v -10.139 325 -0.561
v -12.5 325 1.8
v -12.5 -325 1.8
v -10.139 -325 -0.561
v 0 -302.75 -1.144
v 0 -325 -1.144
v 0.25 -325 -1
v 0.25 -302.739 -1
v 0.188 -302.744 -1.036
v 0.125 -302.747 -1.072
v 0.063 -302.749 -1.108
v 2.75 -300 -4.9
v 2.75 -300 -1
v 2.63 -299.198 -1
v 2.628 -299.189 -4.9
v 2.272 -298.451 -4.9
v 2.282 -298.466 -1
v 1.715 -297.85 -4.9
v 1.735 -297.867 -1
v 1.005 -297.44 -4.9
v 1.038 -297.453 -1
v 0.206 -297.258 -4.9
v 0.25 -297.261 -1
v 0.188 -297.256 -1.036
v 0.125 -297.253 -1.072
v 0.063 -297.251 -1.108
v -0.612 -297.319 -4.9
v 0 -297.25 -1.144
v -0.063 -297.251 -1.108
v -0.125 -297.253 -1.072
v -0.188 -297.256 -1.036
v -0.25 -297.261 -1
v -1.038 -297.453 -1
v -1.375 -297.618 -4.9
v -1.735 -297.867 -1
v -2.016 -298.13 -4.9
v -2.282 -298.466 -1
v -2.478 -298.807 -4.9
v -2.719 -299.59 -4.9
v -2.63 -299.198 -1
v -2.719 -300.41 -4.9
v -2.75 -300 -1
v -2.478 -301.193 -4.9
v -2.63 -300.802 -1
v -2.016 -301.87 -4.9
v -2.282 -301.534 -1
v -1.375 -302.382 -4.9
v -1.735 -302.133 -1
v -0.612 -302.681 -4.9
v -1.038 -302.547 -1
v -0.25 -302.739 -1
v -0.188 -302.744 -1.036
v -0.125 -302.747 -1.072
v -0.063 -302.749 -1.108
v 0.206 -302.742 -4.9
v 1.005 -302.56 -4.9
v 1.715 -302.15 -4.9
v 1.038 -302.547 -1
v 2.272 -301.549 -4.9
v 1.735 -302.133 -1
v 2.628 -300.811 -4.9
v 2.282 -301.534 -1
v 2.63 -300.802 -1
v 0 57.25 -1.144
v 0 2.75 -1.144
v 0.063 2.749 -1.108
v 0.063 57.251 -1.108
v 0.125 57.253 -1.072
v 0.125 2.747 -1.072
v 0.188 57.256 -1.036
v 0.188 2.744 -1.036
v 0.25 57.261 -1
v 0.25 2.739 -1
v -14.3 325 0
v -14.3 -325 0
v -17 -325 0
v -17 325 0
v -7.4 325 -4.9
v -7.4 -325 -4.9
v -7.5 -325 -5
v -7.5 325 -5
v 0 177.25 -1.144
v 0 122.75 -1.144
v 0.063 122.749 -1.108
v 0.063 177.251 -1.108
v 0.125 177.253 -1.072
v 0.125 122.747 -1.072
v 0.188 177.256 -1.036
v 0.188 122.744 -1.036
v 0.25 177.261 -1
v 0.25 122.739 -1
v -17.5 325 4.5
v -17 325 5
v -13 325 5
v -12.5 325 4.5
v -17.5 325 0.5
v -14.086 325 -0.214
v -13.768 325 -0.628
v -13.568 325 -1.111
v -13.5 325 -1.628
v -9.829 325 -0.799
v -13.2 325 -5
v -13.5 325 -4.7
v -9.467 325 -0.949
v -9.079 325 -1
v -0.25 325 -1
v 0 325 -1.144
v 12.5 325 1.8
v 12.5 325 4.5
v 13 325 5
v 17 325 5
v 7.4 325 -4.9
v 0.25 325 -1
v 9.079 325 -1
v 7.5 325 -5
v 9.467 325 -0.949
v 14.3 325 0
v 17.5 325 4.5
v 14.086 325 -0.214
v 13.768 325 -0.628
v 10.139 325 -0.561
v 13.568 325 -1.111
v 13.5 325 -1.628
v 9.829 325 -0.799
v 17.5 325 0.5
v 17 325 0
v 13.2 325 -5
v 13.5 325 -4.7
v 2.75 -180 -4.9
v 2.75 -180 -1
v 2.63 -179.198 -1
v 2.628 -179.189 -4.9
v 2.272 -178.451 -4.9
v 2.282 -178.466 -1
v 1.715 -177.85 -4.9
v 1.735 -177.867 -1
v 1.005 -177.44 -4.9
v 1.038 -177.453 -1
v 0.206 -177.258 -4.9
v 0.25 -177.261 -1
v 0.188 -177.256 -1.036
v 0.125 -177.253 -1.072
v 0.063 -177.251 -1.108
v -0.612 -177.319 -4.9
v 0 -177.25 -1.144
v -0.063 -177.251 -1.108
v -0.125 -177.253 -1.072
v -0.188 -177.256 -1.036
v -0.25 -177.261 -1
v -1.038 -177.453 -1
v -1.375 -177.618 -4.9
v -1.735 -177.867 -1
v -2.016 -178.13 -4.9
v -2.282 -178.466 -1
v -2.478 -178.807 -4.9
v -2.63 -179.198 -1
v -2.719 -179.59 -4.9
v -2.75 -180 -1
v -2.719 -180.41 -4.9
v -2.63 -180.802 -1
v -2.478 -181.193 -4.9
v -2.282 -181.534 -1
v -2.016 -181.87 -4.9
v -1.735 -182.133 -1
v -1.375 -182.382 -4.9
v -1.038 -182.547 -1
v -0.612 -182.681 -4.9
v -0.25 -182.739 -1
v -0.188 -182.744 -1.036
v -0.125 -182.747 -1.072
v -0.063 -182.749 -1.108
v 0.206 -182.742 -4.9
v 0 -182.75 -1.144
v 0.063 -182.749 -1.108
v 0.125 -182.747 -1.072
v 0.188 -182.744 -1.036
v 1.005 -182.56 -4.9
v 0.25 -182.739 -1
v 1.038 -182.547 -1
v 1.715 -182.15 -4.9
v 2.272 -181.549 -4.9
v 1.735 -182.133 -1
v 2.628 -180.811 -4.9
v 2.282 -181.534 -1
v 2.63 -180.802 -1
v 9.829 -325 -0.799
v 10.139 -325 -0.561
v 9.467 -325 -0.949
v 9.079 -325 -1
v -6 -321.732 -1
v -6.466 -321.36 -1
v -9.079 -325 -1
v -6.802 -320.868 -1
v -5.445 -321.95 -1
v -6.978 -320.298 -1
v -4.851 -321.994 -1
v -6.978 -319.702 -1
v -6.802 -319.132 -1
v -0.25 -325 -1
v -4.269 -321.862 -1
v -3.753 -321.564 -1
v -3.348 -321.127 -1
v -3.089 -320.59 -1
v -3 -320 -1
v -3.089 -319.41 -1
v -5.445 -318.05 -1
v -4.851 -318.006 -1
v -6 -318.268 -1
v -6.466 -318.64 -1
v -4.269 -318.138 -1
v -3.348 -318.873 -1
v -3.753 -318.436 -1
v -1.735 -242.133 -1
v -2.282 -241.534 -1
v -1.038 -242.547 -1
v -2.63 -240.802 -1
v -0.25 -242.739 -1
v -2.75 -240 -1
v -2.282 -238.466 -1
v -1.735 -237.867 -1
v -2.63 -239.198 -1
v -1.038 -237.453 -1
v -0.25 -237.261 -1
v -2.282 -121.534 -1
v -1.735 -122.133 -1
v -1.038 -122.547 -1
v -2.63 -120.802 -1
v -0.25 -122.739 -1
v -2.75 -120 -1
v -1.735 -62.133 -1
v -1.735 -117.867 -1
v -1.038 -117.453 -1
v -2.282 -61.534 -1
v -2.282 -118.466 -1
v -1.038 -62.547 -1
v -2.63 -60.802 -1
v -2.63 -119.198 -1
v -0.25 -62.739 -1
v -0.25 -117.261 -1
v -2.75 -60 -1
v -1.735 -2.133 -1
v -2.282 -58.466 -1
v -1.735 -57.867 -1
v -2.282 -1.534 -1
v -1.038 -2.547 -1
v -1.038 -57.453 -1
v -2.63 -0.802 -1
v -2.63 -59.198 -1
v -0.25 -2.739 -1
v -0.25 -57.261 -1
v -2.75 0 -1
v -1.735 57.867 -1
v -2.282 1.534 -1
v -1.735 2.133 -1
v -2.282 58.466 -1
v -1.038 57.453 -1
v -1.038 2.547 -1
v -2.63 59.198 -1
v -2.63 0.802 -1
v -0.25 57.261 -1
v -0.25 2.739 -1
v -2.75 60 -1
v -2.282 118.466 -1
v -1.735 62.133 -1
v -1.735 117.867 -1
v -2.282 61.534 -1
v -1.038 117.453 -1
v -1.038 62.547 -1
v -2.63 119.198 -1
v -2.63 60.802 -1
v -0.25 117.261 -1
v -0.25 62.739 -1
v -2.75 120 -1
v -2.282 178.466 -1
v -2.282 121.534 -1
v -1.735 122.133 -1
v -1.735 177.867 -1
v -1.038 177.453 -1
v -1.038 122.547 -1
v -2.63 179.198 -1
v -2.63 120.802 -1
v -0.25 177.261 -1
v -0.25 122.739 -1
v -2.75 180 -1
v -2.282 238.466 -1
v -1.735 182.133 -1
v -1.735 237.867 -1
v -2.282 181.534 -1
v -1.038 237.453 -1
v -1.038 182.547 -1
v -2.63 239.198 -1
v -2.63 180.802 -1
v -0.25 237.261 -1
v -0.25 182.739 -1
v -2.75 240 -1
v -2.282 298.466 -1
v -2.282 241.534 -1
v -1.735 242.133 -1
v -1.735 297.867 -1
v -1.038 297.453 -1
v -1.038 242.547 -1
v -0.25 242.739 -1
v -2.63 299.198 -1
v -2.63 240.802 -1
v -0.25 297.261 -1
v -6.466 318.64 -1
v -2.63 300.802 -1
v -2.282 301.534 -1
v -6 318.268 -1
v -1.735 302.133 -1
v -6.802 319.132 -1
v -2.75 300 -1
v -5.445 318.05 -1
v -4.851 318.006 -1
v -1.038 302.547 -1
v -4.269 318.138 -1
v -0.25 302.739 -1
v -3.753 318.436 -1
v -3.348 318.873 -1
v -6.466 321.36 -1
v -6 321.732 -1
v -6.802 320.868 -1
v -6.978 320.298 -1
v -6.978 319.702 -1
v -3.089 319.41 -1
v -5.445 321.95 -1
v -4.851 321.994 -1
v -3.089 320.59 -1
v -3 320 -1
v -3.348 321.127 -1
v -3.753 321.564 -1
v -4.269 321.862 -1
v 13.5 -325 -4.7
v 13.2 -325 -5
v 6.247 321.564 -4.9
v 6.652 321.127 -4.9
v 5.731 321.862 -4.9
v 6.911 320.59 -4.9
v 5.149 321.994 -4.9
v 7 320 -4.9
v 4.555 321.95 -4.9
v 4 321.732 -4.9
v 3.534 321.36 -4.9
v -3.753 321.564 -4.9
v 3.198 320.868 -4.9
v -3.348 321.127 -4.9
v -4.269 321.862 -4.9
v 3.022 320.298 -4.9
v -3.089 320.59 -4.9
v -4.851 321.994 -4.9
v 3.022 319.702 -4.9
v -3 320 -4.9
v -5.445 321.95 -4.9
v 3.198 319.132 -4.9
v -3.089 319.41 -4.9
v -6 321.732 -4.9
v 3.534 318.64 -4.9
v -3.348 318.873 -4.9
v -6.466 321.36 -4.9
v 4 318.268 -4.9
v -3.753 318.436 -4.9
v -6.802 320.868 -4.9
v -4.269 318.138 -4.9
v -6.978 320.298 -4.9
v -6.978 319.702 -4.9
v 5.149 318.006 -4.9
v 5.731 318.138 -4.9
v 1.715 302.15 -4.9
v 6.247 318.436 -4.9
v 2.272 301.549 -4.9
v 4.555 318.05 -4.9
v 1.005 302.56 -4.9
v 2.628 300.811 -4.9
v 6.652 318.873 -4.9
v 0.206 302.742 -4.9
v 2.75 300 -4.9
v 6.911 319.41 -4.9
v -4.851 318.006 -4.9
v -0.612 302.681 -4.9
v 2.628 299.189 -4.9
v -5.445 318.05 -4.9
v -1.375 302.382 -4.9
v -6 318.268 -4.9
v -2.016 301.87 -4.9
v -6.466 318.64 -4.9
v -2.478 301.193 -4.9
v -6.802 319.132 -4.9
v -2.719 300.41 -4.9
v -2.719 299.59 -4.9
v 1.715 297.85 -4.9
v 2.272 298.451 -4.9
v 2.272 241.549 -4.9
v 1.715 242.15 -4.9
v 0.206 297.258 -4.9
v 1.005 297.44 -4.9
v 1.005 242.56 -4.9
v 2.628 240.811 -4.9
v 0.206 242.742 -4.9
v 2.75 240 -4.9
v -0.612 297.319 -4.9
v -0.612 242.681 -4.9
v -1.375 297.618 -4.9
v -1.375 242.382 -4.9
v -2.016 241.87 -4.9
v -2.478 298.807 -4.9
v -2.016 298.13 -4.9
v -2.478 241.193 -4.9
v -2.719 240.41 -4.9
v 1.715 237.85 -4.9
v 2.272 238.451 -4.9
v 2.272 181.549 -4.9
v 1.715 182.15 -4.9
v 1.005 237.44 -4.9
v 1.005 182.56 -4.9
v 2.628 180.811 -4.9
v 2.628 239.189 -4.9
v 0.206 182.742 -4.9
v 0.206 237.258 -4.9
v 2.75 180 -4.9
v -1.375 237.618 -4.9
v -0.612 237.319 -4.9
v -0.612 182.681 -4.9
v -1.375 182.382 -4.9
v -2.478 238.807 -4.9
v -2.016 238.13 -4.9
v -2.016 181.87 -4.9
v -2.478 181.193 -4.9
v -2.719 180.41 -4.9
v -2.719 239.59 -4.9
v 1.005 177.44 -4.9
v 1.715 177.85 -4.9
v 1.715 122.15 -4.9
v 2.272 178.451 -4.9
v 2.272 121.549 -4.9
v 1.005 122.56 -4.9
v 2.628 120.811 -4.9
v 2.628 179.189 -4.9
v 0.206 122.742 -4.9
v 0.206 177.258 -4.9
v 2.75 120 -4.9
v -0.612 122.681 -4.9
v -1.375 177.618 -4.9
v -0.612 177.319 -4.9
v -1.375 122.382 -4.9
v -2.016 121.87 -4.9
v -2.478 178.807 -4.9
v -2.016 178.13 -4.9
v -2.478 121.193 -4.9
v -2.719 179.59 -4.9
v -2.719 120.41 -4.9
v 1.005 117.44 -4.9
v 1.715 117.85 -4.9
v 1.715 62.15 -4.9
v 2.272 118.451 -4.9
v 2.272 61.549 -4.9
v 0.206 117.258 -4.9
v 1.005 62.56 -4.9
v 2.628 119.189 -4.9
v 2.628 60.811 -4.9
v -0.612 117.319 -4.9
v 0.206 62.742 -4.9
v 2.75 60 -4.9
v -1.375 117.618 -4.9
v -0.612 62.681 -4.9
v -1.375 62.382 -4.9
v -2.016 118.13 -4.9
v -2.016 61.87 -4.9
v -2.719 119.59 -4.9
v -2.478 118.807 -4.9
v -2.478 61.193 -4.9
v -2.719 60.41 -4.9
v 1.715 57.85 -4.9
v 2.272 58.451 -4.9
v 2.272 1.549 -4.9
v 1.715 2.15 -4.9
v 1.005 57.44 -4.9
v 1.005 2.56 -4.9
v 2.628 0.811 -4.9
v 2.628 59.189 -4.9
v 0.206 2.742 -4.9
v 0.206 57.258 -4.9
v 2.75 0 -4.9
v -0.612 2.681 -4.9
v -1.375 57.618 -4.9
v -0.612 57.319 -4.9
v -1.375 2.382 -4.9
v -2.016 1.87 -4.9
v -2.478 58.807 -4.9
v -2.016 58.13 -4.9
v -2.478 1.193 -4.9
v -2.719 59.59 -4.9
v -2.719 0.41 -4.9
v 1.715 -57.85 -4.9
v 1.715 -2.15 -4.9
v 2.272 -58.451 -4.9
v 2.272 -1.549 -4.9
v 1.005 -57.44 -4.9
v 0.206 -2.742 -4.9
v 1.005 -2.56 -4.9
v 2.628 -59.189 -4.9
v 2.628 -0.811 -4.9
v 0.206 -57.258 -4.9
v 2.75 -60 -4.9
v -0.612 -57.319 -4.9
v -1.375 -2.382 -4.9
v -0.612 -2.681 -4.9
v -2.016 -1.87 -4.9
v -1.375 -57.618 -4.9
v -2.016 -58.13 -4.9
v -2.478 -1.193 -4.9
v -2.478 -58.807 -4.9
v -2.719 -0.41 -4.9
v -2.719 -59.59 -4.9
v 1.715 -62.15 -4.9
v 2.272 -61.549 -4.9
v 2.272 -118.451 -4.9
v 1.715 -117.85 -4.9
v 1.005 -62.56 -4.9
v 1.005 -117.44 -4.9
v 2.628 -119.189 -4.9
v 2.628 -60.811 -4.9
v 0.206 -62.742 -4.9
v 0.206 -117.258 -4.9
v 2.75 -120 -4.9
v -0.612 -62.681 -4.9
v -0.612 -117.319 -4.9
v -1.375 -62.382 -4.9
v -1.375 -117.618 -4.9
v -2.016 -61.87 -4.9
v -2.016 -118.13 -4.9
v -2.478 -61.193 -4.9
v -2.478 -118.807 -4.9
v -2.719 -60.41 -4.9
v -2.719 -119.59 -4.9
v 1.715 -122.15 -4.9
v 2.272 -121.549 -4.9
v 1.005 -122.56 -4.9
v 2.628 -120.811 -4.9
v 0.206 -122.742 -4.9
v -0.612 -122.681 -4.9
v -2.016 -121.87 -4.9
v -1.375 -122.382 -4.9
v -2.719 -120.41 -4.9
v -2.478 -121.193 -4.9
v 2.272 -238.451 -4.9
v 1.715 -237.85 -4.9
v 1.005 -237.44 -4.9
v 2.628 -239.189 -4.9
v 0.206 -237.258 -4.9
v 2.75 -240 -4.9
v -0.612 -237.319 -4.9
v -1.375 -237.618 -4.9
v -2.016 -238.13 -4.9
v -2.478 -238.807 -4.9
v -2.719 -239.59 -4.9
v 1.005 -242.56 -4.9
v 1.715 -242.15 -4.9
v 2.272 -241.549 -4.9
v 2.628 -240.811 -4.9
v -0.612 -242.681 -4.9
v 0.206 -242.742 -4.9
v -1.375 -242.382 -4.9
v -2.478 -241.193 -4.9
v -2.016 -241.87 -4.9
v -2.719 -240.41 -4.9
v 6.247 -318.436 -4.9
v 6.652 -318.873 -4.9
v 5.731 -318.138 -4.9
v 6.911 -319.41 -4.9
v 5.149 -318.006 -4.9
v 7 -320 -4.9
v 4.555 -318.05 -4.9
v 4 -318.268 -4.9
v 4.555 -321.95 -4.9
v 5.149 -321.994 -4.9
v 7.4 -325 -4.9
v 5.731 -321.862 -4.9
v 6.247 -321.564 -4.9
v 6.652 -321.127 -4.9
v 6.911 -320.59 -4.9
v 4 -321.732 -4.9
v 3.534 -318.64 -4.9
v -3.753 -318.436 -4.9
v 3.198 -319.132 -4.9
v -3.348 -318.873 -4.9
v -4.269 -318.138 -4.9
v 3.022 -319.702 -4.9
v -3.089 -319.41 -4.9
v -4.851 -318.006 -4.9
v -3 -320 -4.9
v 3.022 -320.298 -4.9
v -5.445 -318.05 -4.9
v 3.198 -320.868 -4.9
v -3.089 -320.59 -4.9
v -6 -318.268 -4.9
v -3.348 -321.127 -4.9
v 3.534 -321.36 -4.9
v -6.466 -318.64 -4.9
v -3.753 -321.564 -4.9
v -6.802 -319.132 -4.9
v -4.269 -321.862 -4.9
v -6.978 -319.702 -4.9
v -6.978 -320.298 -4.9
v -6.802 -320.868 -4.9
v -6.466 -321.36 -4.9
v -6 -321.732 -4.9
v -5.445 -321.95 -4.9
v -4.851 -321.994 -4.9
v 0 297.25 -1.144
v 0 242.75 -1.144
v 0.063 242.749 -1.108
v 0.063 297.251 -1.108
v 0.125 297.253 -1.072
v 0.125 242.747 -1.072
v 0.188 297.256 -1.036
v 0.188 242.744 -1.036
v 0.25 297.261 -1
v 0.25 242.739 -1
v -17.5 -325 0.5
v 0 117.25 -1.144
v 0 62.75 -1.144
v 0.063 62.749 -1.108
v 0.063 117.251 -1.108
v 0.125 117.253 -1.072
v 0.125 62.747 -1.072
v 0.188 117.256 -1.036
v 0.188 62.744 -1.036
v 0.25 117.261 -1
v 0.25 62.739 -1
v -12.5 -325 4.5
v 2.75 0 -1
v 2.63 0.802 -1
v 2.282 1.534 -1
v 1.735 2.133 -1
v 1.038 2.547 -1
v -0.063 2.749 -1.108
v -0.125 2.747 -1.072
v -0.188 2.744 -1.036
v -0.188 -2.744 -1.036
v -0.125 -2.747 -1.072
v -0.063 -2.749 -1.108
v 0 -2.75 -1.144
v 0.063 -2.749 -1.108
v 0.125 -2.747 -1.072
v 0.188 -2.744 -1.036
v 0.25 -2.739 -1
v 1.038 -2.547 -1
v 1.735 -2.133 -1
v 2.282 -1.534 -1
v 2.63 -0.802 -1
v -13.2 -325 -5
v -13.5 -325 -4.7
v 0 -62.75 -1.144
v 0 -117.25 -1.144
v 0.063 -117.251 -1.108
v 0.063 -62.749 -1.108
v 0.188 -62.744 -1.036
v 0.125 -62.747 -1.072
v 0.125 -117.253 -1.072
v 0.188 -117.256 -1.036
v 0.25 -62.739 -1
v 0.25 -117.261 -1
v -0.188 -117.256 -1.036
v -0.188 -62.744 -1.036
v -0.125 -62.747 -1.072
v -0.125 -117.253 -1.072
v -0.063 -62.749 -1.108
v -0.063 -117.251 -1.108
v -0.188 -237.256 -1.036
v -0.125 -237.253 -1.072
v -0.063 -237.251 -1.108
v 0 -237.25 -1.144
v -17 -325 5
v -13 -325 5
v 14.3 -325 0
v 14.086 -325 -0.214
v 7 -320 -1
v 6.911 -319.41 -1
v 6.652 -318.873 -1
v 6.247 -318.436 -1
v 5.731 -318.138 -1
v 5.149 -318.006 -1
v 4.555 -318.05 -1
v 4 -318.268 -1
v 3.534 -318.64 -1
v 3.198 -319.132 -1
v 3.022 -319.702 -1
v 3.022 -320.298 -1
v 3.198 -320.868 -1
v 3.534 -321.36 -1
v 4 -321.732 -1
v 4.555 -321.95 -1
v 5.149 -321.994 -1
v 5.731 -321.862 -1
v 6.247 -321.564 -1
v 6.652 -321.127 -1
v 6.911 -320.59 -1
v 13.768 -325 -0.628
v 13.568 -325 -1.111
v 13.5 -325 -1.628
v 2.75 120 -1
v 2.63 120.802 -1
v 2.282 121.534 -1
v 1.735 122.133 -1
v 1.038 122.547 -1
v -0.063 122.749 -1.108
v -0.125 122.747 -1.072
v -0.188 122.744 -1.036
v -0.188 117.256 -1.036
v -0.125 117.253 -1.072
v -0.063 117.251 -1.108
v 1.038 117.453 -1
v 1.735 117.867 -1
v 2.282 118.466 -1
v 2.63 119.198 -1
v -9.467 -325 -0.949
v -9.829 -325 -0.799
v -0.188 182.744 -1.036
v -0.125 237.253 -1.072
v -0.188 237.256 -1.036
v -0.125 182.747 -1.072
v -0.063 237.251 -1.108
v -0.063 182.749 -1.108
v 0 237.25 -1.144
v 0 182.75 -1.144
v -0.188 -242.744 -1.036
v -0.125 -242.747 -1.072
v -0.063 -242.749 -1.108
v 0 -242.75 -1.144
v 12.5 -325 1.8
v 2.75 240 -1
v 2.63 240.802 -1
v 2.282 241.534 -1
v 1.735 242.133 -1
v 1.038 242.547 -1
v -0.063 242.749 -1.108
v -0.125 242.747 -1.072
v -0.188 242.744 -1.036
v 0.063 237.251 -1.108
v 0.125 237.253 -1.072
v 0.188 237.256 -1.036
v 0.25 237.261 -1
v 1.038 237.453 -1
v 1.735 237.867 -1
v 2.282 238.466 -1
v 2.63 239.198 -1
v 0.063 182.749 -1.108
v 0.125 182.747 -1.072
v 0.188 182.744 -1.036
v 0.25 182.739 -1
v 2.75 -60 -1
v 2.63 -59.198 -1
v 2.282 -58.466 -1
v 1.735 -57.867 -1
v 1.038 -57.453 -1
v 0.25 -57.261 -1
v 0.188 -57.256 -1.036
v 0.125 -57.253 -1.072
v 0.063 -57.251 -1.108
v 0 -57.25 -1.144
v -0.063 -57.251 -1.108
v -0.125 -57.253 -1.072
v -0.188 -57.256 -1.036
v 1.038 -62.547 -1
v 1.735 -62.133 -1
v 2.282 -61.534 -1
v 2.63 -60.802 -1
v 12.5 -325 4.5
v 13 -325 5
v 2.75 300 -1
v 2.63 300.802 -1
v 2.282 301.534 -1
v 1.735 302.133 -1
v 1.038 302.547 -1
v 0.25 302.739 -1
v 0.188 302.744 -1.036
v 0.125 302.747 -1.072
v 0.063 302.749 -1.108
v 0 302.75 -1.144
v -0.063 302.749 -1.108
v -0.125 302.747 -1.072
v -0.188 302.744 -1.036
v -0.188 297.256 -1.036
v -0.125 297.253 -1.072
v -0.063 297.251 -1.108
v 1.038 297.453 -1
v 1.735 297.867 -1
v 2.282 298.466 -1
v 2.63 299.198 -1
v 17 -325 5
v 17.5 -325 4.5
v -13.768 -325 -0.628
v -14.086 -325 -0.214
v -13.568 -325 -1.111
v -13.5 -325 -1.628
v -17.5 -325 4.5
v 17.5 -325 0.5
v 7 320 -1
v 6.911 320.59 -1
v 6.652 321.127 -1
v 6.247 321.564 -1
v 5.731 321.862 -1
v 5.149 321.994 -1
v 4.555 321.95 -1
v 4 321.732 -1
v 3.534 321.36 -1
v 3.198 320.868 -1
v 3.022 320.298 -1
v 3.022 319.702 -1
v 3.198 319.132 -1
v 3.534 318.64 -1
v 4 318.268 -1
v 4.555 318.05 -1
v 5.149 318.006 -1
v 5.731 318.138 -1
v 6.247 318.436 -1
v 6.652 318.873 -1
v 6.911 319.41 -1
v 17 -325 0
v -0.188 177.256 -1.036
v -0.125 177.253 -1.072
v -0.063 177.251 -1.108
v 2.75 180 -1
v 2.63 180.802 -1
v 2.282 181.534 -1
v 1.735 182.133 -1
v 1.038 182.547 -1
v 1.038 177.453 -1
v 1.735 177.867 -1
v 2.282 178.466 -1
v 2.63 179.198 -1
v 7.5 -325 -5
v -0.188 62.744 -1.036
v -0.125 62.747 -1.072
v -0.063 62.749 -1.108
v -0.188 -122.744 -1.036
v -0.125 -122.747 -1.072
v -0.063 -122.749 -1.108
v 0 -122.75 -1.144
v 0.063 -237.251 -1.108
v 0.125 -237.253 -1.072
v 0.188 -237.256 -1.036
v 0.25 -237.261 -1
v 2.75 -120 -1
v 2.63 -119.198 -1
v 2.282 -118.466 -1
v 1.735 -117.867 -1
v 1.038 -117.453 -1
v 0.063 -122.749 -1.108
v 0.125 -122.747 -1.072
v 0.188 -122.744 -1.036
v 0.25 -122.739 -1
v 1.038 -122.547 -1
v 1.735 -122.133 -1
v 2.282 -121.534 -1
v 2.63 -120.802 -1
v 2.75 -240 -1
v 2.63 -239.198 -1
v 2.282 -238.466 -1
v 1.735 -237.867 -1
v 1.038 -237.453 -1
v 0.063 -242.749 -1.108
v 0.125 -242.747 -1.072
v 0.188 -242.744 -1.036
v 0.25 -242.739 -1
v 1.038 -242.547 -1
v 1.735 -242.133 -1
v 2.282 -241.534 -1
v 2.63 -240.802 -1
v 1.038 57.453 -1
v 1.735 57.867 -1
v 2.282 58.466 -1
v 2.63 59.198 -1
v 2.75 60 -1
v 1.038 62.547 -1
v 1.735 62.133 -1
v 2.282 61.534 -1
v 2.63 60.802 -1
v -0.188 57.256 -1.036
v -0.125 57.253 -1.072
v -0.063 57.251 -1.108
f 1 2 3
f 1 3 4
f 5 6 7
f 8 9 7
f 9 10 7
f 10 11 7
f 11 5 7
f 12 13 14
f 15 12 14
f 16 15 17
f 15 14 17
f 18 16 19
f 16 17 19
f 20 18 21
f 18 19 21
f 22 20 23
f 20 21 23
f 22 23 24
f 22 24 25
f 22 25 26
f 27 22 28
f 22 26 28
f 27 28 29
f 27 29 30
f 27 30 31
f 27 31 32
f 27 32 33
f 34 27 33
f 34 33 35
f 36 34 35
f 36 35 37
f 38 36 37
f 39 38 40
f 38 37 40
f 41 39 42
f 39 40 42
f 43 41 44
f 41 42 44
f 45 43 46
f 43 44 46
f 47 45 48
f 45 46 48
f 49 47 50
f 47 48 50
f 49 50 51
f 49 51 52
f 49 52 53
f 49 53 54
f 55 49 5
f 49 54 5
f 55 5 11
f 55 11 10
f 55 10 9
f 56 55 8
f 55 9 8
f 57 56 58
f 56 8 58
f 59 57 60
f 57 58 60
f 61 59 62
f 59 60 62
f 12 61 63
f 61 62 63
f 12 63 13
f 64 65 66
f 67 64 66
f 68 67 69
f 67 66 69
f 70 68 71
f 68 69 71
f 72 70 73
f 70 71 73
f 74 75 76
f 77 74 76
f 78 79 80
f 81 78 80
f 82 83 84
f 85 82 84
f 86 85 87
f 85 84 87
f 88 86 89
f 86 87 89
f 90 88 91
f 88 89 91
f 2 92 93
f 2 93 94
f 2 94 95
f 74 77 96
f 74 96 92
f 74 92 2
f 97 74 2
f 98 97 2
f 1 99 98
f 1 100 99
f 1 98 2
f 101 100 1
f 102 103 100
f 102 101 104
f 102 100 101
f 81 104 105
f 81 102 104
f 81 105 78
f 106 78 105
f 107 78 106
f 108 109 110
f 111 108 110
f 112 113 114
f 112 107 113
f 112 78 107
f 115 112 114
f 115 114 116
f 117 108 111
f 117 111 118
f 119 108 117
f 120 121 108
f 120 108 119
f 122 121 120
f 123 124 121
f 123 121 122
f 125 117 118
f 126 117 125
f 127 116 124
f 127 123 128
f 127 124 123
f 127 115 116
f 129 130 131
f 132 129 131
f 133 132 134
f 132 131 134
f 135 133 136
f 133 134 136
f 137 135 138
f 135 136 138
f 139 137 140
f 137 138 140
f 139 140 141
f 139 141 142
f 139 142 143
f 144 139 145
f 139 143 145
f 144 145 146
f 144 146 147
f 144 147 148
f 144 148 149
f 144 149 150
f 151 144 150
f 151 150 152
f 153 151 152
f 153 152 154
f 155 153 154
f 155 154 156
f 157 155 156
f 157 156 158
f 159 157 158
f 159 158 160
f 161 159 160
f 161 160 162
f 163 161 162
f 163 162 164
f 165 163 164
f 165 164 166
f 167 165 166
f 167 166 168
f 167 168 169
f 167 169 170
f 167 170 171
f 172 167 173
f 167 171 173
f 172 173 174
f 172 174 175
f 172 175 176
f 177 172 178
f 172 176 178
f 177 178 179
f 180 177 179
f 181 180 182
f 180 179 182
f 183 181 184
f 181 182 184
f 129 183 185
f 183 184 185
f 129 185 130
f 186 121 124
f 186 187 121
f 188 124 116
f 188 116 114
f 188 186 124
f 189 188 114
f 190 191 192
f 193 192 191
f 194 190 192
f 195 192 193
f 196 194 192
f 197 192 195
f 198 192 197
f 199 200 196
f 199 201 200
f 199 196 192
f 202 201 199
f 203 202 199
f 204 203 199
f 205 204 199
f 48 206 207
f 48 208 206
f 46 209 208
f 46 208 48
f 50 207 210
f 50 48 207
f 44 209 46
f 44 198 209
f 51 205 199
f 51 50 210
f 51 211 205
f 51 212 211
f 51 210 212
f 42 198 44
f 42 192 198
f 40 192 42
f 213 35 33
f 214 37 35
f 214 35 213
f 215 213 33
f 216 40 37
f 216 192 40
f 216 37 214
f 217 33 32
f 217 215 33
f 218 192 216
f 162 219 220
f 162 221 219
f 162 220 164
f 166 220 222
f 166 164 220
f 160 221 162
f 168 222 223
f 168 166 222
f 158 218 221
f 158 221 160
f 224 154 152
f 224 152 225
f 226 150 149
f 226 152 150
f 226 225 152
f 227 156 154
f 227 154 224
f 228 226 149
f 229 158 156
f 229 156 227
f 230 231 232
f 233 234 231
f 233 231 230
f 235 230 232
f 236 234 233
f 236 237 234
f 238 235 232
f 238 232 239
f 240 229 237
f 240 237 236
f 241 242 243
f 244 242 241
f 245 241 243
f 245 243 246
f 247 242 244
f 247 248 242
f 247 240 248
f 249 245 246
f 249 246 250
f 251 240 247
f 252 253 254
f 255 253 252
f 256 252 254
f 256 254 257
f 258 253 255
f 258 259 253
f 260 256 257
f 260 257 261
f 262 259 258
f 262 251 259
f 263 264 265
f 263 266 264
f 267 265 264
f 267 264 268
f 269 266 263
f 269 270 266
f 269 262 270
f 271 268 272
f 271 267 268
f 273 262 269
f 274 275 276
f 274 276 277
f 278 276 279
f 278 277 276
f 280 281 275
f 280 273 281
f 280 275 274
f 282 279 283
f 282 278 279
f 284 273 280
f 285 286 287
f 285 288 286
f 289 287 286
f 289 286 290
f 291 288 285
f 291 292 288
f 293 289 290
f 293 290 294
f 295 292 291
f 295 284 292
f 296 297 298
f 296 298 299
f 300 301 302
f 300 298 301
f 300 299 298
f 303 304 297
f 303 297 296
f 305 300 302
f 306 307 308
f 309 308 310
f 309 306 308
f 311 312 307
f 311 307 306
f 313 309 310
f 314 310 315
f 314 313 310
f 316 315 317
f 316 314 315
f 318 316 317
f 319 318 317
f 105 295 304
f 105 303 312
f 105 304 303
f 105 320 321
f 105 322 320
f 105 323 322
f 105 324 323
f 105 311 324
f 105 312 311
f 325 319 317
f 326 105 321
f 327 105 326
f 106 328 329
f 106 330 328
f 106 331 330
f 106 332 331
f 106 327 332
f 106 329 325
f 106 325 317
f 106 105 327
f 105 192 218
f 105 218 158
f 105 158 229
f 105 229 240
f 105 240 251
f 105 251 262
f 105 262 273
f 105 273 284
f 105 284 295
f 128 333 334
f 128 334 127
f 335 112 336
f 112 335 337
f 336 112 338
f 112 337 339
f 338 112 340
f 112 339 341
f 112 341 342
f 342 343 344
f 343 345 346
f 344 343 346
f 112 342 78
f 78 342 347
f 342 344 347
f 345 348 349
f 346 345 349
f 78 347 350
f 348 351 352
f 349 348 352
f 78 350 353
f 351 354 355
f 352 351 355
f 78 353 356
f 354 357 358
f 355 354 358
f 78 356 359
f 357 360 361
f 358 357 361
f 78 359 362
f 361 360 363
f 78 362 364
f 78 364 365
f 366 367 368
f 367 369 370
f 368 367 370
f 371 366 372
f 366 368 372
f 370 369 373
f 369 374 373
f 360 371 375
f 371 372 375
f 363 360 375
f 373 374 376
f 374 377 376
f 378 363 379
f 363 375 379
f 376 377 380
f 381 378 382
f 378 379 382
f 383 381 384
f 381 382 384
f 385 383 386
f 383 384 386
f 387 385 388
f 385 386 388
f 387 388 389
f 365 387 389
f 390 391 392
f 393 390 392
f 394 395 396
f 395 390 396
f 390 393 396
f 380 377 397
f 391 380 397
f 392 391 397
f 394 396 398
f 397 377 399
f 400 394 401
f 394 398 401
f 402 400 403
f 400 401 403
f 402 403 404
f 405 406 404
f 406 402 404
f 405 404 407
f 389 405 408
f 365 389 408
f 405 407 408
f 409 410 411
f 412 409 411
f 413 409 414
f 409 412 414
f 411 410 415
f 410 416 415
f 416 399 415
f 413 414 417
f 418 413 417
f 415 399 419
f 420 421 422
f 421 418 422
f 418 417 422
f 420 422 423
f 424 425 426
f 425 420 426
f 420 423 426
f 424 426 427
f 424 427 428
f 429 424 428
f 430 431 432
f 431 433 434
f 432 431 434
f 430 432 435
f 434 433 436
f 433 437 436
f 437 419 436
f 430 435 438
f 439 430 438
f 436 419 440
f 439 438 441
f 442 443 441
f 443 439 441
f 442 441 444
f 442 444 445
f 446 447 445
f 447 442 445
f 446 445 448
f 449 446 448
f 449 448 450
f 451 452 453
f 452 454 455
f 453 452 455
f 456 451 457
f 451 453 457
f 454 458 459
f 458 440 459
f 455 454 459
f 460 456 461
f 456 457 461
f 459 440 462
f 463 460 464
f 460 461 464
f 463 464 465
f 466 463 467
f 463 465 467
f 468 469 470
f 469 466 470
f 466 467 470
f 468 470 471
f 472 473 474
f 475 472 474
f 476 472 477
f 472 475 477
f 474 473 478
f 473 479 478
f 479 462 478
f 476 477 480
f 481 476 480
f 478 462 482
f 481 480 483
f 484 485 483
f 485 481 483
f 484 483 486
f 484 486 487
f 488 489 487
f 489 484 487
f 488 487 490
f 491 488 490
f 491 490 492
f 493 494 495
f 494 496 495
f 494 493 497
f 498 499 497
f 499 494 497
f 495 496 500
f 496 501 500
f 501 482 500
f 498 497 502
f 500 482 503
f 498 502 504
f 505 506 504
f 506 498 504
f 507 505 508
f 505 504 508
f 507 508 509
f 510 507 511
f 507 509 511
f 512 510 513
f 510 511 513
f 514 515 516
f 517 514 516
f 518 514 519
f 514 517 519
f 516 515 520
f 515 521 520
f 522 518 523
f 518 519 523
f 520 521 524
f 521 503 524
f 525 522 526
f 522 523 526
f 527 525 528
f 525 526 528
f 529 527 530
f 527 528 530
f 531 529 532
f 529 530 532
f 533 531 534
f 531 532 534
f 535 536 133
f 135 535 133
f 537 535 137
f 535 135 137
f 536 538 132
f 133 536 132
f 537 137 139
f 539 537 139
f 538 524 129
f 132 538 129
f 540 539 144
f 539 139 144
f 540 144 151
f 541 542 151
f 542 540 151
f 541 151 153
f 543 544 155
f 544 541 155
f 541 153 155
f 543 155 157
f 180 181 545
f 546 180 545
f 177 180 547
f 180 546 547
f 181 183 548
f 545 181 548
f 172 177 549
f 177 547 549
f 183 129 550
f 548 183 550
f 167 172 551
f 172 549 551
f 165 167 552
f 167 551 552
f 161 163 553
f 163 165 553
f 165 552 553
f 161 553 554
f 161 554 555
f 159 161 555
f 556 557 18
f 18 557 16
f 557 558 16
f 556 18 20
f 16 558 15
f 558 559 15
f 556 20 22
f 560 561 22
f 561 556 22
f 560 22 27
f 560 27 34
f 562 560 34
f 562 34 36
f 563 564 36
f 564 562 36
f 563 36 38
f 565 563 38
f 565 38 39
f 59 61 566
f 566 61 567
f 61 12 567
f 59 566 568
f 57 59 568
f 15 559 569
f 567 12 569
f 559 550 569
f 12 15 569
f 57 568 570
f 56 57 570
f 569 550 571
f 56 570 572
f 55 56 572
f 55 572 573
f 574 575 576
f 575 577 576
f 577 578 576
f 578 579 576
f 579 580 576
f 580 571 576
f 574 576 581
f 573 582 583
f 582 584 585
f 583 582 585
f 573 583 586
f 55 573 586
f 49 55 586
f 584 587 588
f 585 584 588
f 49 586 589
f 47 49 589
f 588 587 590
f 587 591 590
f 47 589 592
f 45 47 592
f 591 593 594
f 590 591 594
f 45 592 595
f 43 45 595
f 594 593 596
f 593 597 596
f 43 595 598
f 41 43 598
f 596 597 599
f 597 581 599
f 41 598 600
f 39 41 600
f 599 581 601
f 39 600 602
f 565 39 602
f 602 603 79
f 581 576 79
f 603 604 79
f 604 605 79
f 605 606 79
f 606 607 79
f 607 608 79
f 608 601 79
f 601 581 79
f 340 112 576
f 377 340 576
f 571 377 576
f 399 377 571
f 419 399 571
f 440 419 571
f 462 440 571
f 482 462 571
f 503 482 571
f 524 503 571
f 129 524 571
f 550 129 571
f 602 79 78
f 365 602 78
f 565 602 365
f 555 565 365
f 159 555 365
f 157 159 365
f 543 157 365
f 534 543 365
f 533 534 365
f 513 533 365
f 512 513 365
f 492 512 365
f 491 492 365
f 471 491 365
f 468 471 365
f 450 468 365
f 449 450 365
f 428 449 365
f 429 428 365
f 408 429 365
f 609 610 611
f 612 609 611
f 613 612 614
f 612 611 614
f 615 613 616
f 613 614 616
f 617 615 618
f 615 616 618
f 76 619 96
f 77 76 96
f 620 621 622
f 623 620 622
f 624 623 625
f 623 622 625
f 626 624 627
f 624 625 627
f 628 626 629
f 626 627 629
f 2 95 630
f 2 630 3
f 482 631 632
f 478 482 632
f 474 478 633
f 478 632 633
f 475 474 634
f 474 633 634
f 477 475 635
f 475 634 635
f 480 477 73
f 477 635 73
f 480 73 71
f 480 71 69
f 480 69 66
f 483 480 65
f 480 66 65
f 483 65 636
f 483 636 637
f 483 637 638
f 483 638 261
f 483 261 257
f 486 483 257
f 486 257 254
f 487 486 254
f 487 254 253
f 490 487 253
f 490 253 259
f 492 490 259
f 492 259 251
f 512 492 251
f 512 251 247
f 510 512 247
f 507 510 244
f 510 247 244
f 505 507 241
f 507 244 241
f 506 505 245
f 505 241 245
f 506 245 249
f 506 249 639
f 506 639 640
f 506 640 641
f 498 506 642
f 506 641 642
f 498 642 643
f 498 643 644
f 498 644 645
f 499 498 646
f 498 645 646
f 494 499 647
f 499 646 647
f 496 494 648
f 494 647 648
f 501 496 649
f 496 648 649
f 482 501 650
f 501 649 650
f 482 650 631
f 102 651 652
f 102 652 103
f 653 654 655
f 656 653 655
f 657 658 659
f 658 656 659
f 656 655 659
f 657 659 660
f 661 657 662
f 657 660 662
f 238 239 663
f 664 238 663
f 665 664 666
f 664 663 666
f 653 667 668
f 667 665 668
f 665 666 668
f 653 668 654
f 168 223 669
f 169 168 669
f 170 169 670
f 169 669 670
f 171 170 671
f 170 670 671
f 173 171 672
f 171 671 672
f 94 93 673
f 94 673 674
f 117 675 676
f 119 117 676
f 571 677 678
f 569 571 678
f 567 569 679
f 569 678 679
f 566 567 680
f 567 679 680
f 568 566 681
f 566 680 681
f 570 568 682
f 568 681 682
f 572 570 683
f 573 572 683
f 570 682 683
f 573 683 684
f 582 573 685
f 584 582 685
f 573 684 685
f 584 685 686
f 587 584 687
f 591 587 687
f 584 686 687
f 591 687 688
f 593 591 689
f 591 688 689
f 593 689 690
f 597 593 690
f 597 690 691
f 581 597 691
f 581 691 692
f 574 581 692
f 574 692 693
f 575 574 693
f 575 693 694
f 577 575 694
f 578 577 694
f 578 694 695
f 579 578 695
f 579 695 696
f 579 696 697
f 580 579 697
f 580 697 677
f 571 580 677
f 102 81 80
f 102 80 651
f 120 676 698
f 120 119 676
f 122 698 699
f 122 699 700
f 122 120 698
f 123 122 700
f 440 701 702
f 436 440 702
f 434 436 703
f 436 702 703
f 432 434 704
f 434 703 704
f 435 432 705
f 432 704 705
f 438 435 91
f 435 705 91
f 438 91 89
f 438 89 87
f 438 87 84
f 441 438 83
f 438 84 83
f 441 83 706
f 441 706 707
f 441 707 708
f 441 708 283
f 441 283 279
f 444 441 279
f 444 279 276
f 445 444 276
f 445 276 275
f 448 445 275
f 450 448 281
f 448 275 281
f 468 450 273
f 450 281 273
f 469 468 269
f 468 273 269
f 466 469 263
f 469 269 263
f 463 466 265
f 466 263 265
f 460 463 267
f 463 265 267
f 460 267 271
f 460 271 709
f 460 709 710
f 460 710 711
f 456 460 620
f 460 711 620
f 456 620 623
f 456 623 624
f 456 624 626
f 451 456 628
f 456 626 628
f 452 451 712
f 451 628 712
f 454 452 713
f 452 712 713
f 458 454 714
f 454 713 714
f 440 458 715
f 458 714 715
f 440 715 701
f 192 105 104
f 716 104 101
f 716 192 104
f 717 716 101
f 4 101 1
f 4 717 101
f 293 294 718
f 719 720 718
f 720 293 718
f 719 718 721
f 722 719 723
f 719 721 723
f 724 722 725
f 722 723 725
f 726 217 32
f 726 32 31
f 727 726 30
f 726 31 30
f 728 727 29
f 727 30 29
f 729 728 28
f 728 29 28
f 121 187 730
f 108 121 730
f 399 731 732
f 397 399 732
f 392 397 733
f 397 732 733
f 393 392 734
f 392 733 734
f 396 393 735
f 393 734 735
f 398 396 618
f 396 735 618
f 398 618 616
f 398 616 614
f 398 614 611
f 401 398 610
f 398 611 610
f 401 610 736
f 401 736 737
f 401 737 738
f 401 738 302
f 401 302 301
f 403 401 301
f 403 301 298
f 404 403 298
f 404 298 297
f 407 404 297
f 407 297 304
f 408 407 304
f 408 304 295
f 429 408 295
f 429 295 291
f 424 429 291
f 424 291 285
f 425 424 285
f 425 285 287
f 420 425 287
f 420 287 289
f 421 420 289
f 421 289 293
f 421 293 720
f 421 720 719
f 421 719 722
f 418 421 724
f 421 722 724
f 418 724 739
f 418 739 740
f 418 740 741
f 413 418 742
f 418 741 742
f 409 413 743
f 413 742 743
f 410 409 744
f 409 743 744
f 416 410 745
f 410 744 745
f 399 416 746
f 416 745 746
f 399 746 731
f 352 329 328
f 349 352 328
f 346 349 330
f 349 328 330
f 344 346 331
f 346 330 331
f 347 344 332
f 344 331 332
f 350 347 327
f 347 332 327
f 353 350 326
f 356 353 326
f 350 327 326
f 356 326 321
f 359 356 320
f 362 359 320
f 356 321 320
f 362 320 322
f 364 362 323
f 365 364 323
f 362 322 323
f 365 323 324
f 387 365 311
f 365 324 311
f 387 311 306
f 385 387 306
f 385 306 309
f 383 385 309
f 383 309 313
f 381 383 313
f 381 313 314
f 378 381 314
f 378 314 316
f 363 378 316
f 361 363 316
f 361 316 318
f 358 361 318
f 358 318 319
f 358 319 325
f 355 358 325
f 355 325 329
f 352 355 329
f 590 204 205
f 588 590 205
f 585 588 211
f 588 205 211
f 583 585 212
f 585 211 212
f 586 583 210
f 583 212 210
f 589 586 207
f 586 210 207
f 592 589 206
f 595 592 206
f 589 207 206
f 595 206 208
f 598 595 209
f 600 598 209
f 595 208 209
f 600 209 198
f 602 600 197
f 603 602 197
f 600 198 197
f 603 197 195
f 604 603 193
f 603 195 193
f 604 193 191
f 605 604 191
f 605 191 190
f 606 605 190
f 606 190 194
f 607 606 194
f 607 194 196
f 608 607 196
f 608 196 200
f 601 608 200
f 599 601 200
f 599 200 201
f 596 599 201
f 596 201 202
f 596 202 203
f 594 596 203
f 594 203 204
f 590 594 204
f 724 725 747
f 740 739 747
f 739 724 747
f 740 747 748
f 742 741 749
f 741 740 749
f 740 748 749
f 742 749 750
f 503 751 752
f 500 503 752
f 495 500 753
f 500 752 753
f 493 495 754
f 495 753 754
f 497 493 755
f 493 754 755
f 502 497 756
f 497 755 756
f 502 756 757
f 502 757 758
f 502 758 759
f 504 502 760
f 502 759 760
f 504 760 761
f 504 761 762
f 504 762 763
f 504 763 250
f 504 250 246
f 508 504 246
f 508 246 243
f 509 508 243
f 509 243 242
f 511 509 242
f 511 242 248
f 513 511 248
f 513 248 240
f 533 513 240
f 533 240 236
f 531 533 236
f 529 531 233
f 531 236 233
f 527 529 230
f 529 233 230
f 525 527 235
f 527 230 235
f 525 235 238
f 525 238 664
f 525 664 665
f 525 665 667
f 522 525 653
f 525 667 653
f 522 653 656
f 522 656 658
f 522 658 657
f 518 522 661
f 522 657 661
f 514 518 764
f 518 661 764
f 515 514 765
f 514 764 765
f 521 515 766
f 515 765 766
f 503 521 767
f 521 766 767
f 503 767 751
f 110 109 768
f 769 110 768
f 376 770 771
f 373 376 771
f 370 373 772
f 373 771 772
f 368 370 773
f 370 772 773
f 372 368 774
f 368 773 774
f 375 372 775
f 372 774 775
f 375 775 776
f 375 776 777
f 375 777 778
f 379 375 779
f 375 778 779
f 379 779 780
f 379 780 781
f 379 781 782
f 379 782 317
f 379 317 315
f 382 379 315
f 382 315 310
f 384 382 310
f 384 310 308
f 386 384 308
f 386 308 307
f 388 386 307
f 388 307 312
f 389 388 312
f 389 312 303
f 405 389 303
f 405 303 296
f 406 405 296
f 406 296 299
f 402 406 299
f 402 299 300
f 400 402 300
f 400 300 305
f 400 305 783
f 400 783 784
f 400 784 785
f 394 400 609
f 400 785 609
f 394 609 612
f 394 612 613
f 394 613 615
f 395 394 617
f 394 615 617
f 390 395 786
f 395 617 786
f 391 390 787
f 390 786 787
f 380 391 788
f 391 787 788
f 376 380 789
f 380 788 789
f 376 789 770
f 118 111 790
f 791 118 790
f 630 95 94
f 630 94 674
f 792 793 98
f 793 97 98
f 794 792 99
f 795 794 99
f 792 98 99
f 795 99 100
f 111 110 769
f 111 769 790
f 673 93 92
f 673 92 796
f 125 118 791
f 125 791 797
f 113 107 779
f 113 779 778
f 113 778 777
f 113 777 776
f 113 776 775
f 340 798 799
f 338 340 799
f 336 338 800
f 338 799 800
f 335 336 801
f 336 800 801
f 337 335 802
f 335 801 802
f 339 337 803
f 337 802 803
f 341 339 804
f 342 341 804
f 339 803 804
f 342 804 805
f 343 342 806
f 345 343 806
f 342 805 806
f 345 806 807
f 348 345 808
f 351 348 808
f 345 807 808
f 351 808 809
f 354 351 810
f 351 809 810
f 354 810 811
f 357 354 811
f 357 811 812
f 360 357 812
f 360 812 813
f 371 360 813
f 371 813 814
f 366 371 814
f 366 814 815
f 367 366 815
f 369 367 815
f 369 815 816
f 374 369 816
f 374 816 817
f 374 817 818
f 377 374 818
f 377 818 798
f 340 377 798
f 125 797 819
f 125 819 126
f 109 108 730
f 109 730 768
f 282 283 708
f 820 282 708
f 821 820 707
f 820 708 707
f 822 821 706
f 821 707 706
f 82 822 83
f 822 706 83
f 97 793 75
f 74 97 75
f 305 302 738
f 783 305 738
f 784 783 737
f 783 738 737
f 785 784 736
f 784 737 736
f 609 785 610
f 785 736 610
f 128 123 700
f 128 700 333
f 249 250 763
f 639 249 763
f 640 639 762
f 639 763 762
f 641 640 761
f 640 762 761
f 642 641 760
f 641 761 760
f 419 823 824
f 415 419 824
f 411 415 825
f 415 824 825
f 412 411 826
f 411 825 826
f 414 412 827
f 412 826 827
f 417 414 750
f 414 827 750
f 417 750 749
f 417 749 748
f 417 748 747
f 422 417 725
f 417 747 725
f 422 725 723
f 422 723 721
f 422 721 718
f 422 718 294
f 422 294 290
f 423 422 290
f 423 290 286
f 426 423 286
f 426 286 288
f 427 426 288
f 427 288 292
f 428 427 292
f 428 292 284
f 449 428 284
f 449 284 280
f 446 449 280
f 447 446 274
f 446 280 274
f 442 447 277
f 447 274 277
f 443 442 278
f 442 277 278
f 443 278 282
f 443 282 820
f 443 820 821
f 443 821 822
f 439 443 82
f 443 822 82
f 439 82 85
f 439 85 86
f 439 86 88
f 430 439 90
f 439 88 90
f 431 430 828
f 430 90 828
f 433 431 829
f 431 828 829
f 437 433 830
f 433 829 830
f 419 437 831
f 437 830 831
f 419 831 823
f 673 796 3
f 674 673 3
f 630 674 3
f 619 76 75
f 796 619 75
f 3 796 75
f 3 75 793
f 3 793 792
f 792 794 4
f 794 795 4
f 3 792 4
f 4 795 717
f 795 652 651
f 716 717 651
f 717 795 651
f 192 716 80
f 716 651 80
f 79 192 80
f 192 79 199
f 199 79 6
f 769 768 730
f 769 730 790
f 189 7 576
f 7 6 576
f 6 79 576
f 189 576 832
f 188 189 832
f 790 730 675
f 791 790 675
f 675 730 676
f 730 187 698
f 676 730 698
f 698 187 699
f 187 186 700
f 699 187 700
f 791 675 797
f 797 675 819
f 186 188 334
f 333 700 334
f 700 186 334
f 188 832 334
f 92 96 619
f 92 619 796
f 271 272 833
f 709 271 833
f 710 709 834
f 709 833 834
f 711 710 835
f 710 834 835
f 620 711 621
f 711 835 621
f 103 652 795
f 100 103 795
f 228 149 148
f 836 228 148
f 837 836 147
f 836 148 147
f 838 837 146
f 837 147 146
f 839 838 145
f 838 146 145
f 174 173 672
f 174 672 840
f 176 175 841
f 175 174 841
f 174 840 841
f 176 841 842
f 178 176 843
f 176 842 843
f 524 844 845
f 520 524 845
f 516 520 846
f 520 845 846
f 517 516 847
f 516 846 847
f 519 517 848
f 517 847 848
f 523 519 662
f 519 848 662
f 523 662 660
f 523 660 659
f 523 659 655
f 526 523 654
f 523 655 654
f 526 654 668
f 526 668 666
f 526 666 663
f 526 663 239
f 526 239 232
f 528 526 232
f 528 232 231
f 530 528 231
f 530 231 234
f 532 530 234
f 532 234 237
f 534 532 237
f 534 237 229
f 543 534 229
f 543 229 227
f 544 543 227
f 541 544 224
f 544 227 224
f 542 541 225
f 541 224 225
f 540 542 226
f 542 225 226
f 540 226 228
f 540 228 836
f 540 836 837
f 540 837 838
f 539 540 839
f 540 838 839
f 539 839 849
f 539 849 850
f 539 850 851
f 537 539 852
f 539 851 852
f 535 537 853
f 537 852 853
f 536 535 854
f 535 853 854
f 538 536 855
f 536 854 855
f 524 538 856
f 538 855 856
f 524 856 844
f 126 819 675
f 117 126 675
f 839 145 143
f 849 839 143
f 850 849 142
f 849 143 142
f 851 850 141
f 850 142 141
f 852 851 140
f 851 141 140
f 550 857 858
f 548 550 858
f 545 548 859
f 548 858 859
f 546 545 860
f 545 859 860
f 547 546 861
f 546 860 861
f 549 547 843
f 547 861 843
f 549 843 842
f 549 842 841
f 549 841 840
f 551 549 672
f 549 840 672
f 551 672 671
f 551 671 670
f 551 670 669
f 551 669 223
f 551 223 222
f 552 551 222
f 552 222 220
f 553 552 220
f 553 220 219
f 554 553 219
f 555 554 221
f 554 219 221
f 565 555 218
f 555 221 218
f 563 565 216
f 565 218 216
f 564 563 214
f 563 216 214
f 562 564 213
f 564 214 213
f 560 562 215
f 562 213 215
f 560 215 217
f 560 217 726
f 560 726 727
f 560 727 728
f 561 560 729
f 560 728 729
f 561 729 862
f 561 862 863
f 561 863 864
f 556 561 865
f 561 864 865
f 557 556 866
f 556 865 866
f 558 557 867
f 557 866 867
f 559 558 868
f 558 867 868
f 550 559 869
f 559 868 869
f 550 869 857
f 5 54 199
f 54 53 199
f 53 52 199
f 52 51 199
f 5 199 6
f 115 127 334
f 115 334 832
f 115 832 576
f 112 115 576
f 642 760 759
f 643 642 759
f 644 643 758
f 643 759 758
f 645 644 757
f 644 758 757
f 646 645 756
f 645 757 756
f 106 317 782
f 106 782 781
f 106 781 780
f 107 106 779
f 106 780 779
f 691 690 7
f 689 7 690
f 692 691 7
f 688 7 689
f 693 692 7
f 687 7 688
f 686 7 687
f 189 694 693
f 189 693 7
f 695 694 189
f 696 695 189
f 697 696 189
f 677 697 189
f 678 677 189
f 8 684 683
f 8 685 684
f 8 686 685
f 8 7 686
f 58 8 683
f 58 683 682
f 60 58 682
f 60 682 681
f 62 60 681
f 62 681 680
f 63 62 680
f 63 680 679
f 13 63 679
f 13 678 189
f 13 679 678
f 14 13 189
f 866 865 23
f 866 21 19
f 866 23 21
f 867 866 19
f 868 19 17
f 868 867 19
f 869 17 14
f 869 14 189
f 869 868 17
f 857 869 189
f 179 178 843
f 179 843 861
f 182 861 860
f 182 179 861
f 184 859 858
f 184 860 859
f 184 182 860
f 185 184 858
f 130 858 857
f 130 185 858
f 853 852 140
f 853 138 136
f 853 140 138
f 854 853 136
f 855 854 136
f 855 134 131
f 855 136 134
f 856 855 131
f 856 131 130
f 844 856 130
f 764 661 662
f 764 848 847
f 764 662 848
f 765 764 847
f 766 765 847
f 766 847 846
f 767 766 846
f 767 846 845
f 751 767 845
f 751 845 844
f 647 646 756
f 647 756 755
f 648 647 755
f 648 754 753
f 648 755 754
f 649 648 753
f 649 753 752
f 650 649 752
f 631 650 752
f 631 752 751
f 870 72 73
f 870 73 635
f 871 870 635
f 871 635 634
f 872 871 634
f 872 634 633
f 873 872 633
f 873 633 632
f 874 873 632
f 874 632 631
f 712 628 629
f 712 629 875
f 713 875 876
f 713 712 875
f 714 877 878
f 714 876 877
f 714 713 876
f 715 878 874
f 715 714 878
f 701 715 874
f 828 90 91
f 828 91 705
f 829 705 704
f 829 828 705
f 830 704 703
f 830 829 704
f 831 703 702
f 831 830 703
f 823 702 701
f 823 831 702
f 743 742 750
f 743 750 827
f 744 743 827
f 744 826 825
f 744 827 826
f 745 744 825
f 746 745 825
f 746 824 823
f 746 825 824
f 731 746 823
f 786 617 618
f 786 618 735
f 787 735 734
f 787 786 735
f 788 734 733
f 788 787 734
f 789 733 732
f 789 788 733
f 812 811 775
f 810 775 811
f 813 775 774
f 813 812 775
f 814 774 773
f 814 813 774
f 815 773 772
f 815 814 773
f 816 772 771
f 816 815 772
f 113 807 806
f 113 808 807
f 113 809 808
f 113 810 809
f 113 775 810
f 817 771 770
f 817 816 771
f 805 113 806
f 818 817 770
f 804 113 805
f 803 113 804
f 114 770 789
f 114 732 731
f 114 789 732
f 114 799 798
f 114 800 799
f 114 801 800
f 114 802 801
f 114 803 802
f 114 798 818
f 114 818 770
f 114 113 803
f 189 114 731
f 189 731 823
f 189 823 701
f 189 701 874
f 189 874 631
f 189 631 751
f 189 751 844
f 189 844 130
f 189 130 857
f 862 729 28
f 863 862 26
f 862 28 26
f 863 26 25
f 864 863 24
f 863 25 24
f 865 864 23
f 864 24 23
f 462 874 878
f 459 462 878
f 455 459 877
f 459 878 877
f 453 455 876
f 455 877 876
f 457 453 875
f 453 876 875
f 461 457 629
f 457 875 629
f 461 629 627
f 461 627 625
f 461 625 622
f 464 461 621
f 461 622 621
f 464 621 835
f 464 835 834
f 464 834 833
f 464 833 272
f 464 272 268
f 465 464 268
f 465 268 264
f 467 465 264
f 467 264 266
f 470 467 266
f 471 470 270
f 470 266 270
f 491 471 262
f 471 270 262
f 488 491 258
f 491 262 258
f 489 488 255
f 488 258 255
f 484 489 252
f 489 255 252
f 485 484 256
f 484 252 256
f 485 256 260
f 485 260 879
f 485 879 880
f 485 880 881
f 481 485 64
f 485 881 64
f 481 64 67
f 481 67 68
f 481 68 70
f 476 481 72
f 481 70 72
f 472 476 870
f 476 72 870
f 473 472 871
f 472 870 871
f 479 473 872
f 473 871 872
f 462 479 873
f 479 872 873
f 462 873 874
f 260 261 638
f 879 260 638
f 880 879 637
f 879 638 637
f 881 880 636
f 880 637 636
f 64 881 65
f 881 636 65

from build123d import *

# Parameters (mm, degrees)
BOSS_EXTRU_1_DEPTH                  = 650
ENL_V_MAT_EXTRU_1_DEPTH             = 651.254758327
ENL_V_MAT_EXTRU_2_DEPTH             = 650
ENL_V_MAT_EXTRU_3_DEPTH             = 651.254758327
ENL_V_MAT_EXTRU_4_DEPTH             = 650
DIAM_TRE_DU_PER_AGE_5_5_5_5_1_D     = 5.5
DIAM_TRE_DU_PER_AGE_5_5_5_5_1_DEPTH = 9.900000103
CHANFREIN1_SIZE2                    = 0.499999975
CHANFREIN1_SIZE                     = 0.5
CHANFREIN2_SIZE                     = 0.3
CHANFREIN3_SIZE2                    = 0.500000028
CHANFREIN3_SIZE                     = 0.499999997
CHANFREIN4_SIZE                     = 0.5
CHANFREIN4_SIZE2                    = 0.500000014
CONG_1_R                            = 1.499999963
CONG_2_R                            = 1.999999944
ESQUISSE8_R                         = 2
ENL_V_MAT_EXTRU_5_DEPTH             = 10


with BuildPart() as part:
    # Esquisse1 → Boss.-Extru.1 (new body)
    with BuildSketch(Plane(origin=(0, 325, 0), x_dir=(1, 0, 0), z_dir=(0, 1, 0))):
        Polygon((-9.70002034, 1.00000045), (9.70002034, 1.00000045), (12.50002072, -1.79999993), (12.50002072, -4.999999928), (17.50002072, -4.999999928), (17.50002072, 5.000000175), (-17.50002072, 5.000000175), (-17.50002072, -4.999999928), (-12.50002072, -4.999999928), (-12.50002072, -1.79999993), align=None)
    extrude(amount=-BOSS_EXTRU_1_DEPTH)

    # Esquisse2 → Enlèv. mat.-Extru.1 (cut, through all)
    with BuildSketch(Plane.XZ.offset(325)):
        Polygon((-14.30002069, -6.7e-08), (-17.50002072, -6.7e-08), (-17.50002072, -5.000000175), (-13.50002072, -5.000000175), (-13.50002072, -0.799999947), align=None)
    extrude(amount=-ENL_V_MAT_EXTRU_1_DEPTH, mode=Mode.SUBTRACT)

    # Esquisse3 → Enlèv. mat.-Extru.2 (cut)
    with BuildSketch(Plane.XZ.offset(325)):
        Polygon((0.25, -1.000000175), (-0.25, -1.000000175), (1e-09, -1.144337743), align=None)
    extrude(amount=-ENL_V_MAT_EXTRU_2_DEPTH, mode=Mode.SUBTRACT)

    # Esquisse4 → Enlèv. mat.-Extru.3 (cut, through all)
    with BuildSketch(Plane.XZ.offset(325)):
        Polygon((13.50002072, -0.799999925), (13.50002072, -5.000000175), (17.50002072, -5.000000175), (17.50002072, 7.5e-08), (14.30002072, 7.5e-08), align=None)
    extrude(amount=-ENL_V_MAT_EXTRU_3_DEPTH, mode=Mode.SUBTRACT)

    # Esquisse5 → Enlèv. mat.-Extru.4 (cut)
    with BuildSketch(Plane.XZ.offset(325)):
        Polygon((-7.50002072, -5.000000175), (7.50002072, -5.000000175), (7.40002072, -4.900000175), (-7.40002072, -4.900000175), align=None)
    extrude(amount=-ENL_V_MAT_EXTRU_4_DEPTH, mode=Mode.SUBTRACT)

    # Diamètre du perçage Ø5.5 (5.5)1
    with Locations(Plane(origin=(0, 0, -4.900000175), x_dir=(-1, 0, 0), z_dir=(0, 0, -1))):
        with Locations((0, 300), (0, 240), (0, 180), (0, 120), (0, 60), (0, 0), (0, -60), (0, -120), (0, -180), (0, -240), (0, -300)):
            Hole(DIAM_TRE_DU_PER_AGE_5_5_5_5_1_D / 2, depth=DIAM_TRE_DU_PER_AGE_5_5_5_5_1_DEPTH)

    # Chanfrein1
    chanfrein1_edges = [part.edges().sort_by_distance(p)[0] for p in [
        (-17.50002072, 0, 4.999999928),
        (17.50002072, 0, 4.999999928),
    ]]
    chamfer(chanfrein1_edges, length=CHANFREIN1_SIZE, length2=CHANFREIN1_SIZE2)

    # Chanfrein2
    chanfrein2_edges = [part.edges().sort_by_distance(p)[0] for p in [
        (-13.50002072, 0, -5.000000175),
        (13.50002072, 0, -5.000000175),
    ]]
    chamfer(chanfrein2_edges, length=CHANFREIN2_SIZE)

    # Chanfrein3
    chanfrein3_edges = [part.edges().sort_by_distance(p)[0] for p in [
        (-12.50002072, 0, 4.999999928),
        (12.50002072, 0, 4.999999928),
        (-17.50002072, 0, -6.7e-08),
    ]]
    chamfer(chanfrein3_edges, length=CHANFREIN3_SIZE, length2=CHANFREIN3_SIZE2)

    # Chanfrein4
    chanfrein4_edges = [part.edges().sort_by_distance(p)[0] for p in [
        (17.50002072, 0, 7.5e-08),
    ]]
    chanfrein4_side = [part.faces().sort_by_distance(p)[0] for p in [
        (15.90002072, 0, 7.5e-08),
    ]]
    chamfer(chanfrein4_edges, length=CHANFREIN4_SIZE, length2=CHANFREIN4_SIZE2, reference=chanfrein4_side[0])

    # Congé1
    cong_1_edges = [part.edges().sort_by_distance(p)[0] for p in [
        (9.70002034, 0, -1.00000045),
        (-9.70002034, 0, -1.00000045),
    ]]
    fillet(cong_1_edges, radius=CONG_1_R)

    # Congé2
    cong_2_edges = [part.edges().sort_by_distance(p)[0] for p in [
        (-13.50002072, 0, -0.799999947),
        (13.50002072, 0, -0.799999925),
    ]]
    fillet(cong_2_edges, radius=CONG_2_R)

    # Esquisse8 → Enlèv. mat.-Extru.5 (cut)
    with BuildSketch(Plane.XY.offset(-1.00000045)):
        with Locations((-4.999999999, -320)):
            Circle(ESQUISSE8_R)
        with Locations((5.000000001, -320)):
            Circle(ESQUISSE8_R)
        with Locations((-4.999999999, 320)):
            Circle(ESQUISSE8_R)
        with Locations((5.000000001, 320)):
            Circle(ESQUISSE8_R)
    extrude(amount=-ENL_V_MAT_EXTRU_5_DEPTH, mode=Mode.SUBTRACT)


solid = part.part
